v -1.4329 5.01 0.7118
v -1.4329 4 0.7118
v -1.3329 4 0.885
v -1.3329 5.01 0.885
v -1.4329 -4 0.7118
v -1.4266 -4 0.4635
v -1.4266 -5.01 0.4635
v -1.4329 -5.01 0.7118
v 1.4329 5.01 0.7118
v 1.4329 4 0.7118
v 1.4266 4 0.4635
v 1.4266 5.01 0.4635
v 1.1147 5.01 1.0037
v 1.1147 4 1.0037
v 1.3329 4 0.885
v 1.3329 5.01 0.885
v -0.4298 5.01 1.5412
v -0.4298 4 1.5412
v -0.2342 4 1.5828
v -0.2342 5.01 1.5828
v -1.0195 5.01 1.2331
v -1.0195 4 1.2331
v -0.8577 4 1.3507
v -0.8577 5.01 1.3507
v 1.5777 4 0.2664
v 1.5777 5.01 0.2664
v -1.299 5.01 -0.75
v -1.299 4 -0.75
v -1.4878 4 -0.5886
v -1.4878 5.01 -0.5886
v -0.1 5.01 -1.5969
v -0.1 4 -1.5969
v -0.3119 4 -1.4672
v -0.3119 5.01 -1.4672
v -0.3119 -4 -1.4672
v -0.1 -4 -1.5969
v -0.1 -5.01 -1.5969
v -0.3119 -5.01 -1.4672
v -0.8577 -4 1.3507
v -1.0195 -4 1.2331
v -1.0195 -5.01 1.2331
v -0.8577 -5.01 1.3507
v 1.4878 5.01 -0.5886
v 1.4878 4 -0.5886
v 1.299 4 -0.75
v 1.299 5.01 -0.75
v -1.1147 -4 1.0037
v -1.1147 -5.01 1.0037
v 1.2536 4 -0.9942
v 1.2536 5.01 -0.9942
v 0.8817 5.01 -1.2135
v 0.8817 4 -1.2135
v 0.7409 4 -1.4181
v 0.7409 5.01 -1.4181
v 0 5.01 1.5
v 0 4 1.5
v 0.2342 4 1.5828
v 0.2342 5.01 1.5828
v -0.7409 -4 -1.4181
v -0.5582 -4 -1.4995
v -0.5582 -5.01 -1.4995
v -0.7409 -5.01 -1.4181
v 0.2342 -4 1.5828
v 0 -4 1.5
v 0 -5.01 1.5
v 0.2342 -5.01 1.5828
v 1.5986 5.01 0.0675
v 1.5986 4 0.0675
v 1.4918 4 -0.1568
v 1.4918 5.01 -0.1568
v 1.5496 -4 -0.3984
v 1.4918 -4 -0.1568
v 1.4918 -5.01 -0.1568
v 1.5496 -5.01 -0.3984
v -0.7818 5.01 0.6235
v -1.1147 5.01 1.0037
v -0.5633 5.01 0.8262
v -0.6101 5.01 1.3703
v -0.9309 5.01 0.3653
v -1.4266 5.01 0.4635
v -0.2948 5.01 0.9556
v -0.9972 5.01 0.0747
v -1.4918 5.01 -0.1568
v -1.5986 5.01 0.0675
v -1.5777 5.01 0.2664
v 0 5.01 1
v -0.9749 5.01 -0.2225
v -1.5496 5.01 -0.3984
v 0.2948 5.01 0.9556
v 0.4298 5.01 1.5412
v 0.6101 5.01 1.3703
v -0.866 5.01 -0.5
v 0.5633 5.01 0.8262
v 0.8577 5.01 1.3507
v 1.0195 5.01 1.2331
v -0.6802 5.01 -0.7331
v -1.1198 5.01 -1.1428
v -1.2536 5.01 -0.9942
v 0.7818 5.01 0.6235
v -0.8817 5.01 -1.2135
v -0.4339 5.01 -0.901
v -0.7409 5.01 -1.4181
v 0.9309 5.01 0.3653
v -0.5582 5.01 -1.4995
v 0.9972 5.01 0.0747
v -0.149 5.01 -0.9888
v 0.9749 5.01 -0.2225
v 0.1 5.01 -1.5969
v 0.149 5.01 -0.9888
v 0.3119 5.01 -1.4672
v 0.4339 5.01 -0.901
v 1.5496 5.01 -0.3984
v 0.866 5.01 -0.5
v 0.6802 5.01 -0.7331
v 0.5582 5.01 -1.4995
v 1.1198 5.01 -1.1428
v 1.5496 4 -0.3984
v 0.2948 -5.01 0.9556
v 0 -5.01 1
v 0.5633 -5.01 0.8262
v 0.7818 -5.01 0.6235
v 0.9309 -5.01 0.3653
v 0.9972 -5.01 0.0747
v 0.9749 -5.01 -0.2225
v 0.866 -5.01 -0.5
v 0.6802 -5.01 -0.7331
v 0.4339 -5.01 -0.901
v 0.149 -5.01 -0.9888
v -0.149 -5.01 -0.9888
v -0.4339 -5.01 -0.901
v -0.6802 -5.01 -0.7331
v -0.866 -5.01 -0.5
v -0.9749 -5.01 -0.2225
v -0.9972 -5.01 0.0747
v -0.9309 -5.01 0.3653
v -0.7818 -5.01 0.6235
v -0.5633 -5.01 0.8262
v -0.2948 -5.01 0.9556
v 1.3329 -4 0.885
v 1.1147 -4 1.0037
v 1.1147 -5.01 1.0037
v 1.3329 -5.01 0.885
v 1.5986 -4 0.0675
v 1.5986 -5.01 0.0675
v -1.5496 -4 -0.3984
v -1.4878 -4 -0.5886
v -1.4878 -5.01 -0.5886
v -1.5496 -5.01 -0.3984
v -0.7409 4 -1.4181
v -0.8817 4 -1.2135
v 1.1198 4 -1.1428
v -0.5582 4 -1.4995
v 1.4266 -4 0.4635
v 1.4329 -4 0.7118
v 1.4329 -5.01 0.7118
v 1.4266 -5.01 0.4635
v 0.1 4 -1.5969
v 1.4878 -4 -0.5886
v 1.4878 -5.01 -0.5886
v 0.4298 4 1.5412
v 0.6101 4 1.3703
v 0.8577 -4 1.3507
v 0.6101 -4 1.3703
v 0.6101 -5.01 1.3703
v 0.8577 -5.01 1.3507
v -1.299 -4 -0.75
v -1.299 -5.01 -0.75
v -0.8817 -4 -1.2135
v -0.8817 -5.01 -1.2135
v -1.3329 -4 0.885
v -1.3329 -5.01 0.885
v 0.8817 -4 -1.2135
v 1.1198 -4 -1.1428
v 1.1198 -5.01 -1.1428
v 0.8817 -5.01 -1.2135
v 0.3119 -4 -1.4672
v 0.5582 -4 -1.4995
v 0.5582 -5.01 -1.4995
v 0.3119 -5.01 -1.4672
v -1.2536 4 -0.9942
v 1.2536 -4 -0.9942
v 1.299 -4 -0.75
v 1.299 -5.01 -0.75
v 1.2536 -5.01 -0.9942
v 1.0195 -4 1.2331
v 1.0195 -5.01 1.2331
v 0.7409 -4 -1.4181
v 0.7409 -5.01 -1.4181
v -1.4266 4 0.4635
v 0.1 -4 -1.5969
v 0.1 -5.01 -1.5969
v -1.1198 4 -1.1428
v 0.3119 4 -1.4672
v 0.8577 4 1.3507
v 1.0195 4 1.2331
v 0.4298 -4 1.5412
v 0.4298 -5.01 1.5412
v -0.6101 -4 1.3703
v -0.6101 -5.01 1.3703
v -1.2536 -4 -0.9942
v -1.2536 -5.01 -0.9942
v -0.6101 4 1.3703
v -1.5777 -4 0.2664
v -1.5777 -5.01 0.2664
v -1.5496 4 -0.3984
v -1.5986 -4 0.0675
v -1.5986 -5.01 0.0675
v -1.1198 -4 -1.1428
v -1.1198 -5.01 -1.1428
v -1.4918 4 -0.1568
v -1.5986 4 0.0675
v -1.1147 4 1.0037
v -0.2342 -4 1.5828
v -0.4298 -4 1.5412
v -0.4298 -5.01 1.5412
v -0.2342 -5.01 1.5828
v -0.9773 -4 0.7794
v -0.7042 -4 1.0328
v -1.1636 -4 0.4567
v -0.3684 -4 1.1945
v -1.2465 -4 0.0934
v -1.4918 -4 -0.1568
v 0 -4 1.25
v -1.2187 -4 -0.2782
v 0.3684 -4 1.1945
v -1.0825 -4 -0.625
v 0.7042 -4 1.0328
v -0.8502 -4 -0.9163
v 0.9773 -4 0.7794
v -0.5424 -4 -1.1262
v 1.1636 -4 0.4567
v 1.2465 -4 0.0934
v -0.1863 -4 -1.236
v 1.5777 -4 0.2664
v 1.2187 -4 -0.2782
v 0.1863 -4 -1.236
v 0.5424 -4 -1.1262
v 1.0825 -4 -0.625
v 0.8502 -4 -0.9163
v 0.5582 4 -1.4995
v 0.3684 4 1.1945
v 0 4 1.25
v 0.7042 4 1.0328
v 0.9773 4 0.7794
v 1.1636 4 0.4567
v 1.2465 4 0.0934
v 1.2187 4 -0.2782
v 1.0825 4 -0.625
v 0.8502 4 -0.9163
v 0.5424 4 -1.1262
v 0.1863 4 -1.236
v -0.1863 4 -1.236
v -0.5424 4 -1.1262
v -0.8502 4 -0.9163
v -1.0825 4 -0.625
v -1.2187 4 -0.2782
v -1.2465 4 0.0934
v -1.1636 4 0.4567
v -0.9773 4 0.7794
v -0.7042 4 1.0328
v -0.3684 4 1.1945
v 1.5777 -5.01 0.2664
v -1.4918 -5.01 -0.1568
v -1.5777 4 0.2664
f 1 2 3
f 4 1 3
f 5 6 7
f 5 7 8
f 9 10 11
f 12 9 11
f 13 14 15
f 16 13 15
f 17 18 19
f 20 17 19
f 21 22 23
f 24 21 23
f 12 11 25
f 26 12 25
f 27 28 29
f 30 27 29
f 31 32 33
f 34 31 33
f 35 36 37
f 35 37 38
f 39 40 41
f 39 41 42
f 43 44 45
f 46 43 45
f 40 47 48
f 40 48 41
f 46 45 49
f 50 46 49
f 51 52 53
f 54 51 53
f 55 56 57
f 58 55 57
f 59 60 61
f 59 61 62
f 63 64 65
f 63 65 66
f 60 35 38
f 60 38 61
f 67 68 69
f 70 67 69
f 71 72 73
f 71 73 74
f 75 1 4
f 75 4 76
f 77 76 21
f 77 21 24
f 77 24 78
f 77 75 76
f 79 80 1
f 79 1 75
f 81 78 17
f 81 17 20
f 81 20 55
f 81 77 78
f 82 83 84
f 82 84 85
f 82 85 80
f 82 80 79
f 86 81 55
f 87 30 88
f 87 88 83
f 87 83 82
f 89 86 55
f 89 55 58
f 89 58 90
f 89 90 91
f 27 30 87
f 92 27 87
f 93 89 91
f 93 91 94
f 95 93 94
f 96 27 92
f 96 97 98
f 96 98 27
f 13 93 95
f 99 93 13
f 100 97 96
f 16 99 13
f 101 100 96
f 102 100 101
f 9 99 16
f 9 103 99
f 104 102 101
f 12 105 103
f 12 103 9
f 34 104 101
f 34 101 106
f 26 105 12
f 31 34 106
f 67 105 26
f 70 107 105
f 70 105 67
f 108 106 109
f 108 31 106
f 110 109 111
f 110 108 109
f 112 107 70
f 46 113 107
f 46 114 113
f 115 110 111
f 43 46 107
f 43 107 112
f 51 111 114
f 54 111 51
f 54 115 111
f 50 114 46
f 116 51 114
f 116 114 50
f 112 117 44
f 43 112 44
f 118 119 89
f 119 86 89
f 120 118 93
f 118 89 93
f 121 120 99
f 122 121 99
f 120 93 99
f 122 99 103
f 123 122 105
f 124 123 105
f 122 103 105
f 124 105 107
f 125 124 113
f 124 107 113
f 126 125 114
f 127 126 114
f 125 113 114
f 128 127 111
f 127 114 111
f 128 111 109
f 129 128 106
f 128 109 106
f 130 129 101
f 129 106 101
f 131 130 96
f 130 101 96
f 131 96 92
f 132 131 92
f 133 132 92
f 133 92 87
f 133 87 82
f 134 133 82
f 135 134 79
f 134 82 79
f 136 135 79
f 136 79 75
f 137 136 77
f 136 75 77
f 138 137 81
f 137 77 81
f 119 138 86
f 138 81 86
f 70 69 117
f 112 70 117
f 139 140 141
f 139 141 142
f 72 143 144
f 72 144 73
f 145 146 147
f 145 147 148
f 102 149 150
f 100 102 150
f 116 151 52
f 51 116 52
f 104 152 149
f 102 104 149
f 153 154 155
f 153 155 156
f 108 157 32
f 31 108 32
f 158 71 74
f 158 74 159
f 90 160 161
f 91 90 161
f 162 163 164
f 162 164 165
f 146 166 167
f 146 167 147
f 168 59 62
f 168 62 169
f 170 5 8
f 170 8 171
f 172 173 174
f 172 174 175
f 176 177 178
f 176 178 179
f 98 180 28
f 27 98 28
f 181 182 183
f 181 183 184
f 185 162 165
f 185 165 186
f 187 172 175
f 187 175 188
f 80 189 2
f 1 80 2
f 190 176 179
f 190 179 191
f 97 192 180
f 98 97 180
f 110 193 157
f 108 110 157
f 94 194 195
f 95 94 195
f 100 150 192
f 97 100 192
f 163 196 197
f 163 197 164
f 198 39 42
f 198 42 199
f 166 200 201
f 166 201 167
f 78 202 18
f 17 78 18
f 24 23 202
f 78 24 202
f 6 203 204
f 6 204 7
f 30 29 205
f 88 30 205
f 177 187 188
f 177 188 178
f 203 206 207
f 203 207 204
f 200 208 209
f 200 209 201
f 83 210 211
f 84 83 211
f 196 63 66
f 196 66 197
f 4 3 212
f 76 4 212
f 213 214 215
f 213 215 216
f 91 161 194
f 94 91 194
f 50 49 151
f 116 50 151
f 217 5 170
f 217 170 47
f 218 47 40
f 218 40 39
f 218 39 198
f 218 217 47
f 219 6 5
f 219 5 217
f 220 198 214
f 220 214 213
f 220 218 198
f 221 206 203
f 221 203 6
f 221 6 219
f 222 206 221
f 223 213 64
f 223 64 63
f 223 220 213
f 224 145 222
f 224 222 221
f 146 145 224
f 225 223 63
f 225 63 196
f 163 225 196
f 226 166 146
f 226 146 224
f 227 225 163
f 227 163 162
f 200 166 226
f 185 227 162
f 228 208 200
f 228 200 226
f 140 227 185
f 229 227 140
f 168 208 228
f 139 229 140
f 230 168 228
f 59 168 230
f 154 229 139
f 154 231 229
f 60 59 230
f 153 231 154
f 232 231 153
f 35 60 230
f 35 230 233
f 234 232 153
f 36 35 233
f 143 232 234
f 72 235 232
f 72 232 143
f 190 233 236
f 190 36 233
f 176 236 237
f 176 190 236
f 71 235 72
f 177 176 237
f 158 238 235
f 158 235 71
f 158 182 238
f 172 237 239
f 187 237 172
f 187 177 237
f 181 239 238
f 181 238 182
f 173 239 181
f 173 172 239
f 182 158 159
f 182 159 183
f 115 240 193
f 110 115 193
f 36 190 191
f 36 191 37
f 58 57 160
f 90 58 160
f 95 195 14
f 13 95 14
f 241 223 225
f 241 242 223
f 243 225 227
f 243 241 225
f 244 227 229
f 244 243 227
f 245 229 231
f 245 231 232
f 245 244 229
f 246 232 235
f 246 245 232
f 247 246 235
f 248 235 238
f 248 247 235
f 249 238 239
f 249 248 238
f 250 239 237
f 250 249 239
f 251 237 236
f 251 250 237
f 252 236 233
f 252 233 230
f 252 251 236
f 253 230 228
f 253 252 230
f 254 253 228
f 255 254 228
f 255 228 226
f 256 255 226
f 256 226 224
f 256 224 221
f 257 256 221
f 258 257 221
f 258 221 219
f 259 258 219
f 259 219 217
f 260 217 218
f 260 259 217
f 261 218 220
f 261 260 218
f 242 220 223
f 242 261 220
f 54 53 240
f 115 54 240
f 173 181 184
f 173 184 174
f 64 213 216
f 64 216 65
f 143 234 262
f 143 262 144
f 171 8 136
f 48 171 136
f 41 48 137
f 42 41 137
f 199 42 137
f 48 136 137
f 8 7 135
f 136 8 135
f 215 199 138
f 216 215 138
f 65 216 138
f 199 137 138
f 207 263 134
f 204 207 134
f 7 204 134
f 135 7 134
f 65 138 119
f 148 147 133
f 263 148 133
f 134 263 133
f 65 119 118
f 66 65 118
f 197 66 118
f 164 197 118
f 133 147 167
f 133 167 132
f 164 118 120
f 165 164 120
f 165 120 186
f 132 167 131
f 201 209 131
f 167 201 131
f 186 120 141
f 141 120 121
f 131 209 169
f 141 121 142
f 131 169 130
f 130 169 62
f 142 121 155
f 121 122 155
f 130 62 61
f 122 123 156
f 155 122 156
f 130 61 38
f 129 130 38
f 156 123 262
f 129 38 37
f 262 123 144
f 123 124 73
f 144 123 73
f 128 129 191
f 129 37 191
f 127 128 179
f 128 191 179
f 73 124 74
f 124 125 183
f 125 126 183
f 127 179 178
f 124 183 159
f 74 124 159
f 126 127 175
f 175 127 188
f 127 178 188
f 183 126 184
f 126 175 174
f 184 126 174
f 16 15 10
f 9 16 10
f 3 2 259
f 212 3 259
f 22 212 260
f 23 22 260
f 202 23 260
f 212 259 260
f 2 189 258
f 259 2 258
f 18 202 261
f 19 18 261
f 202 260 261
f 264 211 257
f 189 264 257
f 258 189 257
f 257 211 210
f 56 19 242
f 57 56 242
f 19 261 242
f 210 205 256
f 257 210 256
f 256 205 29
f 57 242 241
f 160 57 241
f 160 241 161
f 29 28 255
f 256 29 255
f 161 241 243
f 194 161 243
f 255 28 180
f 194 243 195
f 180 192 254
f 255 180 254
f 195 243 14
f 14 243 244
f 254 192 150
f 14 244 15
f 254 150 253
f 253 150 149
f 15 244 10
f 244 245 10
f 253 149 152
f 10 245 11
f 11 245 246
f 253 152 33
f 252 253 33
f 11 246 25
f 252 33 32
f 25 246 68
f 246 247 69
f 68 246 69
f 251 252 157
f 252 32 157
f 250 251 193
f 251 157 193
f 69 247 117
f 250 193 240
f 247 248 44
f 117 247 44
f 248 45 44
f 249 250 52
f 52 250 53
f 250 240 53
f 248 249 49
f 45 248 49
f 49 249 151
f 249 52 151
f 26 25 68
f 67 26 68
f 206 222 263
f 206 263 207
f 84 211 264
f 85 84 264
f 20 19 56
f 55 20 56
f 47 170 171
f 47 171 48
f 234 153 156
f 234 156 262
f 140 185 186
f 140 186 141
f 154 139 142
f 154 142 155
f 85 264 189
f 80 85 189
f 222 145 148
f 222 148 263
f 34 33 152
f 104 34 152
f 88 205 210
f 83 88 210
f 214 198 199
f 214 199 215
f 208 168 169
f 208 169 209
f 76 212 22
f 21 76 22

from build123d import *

# Parameters (mm, degrees)
SKETCH1_R           = 1.25
SKETCH1_R_2         = 1
BOSS_EXTRUDE1_DEPTH = 4
SKETCH2_R           = 1
BOSS_EXTRUDE2_DEPTH = 1.01


with BuildPart() as part:
    # Sketch1 → Boss-Extrude1 (new body)
    with BuildSketch(Plane(origin=(0, 0, 0), x_dir=(1, 0, 0), z_dir=(0, 1, 0))):
        with Locations(Location((0, 0, 0), (0, 0, 270))):
            Circle(SKETCH1_R)
        with Locations(Location((0, 0, 0), (0, 0, 270))):
            Circle(SKETCH1_R_2, mode=Mode.SUBTRACT)
    boss_extrude1 = extrude(amount=BOSS_EXTRUDE1_DEPTH)

    # Sketch2 → Boss-Extrude2 (add)
    with BuildSketch(Plane(origin=(0, 4, 0), x_dir=(1, 0, 0), z_dir=(0, 1, 0))):
        Polygon((-0.740860879, 1.418141445), (-0.881677878, 1.213525492), (-1.11979406, 1.142830374), (-1.253620181, 0.994201408), (-1.299038106, 0.75), (-1.487813767, 0.58856622), (-1.549617166, 0.398354916), (-1.491782843, 0.156792695), (-1.598576957, -0.067466381), (-1.577671264, -0.26637076), (-1.426584774, -0.463525492), (-1.432931669, -0.711833431), (-1.332931669, -0.885038512), (-1.114717238, -1.00369591), (-1.019519477, -1.233118014), (-0.857716078, -1.350675064), (-0.610104965, -1.370318186), (-0.429823106, -1.54118529), (-0.234193585, -1.582767628), (0, -1.5), (0.234193585, -1.582767628), (0.429823106, -1.54118529), (0.610104965, -1.370318186), (0.857716078, -1.350675064), (1.019519477, -1.233118014), (1.114717238, -1.00369591), (1.332931669, -0.885038512), (1.432931669, -0.711833431), (1.426584774, -0.463525492), (1.577671264, -0.26637076), (1.598576957, -0.067466381), (1.491782843, 0.156792695), (1.549617166, 0.398354916), (1.487813767, 0.58856622), (1.299038106, 0.75), (1.253620181, 0.994201408), (1.11979406, 1.142830374), (0.881677878, 1.213525492), (0.740860879, 1.418141445), (0.558151787, 1.499488774), (0.311867536, 1.467221401), (0.1, 1.596871942), (-0.1, 1.596871942), (-0.311867536, 1.467221401), (-0.558151787, 1.499488774), align=None)
        with Locations(Location((0, 0, 0), (0, 0, 270))):
            Circle(SKETCH2_R, mode=Mode.SUBTRACT)
    boss_extrude2 = extrude(amount=BOSS_EXTRUDE2_DEPTH)

    # Mirror1: Boss-Extrude1, Boss-Extrude2 across plane
    add(boss_extrude1.mirror(Plane.ZX))
    add(boss_extrude2.mirror(Plane.ZX))


solid = part.part
